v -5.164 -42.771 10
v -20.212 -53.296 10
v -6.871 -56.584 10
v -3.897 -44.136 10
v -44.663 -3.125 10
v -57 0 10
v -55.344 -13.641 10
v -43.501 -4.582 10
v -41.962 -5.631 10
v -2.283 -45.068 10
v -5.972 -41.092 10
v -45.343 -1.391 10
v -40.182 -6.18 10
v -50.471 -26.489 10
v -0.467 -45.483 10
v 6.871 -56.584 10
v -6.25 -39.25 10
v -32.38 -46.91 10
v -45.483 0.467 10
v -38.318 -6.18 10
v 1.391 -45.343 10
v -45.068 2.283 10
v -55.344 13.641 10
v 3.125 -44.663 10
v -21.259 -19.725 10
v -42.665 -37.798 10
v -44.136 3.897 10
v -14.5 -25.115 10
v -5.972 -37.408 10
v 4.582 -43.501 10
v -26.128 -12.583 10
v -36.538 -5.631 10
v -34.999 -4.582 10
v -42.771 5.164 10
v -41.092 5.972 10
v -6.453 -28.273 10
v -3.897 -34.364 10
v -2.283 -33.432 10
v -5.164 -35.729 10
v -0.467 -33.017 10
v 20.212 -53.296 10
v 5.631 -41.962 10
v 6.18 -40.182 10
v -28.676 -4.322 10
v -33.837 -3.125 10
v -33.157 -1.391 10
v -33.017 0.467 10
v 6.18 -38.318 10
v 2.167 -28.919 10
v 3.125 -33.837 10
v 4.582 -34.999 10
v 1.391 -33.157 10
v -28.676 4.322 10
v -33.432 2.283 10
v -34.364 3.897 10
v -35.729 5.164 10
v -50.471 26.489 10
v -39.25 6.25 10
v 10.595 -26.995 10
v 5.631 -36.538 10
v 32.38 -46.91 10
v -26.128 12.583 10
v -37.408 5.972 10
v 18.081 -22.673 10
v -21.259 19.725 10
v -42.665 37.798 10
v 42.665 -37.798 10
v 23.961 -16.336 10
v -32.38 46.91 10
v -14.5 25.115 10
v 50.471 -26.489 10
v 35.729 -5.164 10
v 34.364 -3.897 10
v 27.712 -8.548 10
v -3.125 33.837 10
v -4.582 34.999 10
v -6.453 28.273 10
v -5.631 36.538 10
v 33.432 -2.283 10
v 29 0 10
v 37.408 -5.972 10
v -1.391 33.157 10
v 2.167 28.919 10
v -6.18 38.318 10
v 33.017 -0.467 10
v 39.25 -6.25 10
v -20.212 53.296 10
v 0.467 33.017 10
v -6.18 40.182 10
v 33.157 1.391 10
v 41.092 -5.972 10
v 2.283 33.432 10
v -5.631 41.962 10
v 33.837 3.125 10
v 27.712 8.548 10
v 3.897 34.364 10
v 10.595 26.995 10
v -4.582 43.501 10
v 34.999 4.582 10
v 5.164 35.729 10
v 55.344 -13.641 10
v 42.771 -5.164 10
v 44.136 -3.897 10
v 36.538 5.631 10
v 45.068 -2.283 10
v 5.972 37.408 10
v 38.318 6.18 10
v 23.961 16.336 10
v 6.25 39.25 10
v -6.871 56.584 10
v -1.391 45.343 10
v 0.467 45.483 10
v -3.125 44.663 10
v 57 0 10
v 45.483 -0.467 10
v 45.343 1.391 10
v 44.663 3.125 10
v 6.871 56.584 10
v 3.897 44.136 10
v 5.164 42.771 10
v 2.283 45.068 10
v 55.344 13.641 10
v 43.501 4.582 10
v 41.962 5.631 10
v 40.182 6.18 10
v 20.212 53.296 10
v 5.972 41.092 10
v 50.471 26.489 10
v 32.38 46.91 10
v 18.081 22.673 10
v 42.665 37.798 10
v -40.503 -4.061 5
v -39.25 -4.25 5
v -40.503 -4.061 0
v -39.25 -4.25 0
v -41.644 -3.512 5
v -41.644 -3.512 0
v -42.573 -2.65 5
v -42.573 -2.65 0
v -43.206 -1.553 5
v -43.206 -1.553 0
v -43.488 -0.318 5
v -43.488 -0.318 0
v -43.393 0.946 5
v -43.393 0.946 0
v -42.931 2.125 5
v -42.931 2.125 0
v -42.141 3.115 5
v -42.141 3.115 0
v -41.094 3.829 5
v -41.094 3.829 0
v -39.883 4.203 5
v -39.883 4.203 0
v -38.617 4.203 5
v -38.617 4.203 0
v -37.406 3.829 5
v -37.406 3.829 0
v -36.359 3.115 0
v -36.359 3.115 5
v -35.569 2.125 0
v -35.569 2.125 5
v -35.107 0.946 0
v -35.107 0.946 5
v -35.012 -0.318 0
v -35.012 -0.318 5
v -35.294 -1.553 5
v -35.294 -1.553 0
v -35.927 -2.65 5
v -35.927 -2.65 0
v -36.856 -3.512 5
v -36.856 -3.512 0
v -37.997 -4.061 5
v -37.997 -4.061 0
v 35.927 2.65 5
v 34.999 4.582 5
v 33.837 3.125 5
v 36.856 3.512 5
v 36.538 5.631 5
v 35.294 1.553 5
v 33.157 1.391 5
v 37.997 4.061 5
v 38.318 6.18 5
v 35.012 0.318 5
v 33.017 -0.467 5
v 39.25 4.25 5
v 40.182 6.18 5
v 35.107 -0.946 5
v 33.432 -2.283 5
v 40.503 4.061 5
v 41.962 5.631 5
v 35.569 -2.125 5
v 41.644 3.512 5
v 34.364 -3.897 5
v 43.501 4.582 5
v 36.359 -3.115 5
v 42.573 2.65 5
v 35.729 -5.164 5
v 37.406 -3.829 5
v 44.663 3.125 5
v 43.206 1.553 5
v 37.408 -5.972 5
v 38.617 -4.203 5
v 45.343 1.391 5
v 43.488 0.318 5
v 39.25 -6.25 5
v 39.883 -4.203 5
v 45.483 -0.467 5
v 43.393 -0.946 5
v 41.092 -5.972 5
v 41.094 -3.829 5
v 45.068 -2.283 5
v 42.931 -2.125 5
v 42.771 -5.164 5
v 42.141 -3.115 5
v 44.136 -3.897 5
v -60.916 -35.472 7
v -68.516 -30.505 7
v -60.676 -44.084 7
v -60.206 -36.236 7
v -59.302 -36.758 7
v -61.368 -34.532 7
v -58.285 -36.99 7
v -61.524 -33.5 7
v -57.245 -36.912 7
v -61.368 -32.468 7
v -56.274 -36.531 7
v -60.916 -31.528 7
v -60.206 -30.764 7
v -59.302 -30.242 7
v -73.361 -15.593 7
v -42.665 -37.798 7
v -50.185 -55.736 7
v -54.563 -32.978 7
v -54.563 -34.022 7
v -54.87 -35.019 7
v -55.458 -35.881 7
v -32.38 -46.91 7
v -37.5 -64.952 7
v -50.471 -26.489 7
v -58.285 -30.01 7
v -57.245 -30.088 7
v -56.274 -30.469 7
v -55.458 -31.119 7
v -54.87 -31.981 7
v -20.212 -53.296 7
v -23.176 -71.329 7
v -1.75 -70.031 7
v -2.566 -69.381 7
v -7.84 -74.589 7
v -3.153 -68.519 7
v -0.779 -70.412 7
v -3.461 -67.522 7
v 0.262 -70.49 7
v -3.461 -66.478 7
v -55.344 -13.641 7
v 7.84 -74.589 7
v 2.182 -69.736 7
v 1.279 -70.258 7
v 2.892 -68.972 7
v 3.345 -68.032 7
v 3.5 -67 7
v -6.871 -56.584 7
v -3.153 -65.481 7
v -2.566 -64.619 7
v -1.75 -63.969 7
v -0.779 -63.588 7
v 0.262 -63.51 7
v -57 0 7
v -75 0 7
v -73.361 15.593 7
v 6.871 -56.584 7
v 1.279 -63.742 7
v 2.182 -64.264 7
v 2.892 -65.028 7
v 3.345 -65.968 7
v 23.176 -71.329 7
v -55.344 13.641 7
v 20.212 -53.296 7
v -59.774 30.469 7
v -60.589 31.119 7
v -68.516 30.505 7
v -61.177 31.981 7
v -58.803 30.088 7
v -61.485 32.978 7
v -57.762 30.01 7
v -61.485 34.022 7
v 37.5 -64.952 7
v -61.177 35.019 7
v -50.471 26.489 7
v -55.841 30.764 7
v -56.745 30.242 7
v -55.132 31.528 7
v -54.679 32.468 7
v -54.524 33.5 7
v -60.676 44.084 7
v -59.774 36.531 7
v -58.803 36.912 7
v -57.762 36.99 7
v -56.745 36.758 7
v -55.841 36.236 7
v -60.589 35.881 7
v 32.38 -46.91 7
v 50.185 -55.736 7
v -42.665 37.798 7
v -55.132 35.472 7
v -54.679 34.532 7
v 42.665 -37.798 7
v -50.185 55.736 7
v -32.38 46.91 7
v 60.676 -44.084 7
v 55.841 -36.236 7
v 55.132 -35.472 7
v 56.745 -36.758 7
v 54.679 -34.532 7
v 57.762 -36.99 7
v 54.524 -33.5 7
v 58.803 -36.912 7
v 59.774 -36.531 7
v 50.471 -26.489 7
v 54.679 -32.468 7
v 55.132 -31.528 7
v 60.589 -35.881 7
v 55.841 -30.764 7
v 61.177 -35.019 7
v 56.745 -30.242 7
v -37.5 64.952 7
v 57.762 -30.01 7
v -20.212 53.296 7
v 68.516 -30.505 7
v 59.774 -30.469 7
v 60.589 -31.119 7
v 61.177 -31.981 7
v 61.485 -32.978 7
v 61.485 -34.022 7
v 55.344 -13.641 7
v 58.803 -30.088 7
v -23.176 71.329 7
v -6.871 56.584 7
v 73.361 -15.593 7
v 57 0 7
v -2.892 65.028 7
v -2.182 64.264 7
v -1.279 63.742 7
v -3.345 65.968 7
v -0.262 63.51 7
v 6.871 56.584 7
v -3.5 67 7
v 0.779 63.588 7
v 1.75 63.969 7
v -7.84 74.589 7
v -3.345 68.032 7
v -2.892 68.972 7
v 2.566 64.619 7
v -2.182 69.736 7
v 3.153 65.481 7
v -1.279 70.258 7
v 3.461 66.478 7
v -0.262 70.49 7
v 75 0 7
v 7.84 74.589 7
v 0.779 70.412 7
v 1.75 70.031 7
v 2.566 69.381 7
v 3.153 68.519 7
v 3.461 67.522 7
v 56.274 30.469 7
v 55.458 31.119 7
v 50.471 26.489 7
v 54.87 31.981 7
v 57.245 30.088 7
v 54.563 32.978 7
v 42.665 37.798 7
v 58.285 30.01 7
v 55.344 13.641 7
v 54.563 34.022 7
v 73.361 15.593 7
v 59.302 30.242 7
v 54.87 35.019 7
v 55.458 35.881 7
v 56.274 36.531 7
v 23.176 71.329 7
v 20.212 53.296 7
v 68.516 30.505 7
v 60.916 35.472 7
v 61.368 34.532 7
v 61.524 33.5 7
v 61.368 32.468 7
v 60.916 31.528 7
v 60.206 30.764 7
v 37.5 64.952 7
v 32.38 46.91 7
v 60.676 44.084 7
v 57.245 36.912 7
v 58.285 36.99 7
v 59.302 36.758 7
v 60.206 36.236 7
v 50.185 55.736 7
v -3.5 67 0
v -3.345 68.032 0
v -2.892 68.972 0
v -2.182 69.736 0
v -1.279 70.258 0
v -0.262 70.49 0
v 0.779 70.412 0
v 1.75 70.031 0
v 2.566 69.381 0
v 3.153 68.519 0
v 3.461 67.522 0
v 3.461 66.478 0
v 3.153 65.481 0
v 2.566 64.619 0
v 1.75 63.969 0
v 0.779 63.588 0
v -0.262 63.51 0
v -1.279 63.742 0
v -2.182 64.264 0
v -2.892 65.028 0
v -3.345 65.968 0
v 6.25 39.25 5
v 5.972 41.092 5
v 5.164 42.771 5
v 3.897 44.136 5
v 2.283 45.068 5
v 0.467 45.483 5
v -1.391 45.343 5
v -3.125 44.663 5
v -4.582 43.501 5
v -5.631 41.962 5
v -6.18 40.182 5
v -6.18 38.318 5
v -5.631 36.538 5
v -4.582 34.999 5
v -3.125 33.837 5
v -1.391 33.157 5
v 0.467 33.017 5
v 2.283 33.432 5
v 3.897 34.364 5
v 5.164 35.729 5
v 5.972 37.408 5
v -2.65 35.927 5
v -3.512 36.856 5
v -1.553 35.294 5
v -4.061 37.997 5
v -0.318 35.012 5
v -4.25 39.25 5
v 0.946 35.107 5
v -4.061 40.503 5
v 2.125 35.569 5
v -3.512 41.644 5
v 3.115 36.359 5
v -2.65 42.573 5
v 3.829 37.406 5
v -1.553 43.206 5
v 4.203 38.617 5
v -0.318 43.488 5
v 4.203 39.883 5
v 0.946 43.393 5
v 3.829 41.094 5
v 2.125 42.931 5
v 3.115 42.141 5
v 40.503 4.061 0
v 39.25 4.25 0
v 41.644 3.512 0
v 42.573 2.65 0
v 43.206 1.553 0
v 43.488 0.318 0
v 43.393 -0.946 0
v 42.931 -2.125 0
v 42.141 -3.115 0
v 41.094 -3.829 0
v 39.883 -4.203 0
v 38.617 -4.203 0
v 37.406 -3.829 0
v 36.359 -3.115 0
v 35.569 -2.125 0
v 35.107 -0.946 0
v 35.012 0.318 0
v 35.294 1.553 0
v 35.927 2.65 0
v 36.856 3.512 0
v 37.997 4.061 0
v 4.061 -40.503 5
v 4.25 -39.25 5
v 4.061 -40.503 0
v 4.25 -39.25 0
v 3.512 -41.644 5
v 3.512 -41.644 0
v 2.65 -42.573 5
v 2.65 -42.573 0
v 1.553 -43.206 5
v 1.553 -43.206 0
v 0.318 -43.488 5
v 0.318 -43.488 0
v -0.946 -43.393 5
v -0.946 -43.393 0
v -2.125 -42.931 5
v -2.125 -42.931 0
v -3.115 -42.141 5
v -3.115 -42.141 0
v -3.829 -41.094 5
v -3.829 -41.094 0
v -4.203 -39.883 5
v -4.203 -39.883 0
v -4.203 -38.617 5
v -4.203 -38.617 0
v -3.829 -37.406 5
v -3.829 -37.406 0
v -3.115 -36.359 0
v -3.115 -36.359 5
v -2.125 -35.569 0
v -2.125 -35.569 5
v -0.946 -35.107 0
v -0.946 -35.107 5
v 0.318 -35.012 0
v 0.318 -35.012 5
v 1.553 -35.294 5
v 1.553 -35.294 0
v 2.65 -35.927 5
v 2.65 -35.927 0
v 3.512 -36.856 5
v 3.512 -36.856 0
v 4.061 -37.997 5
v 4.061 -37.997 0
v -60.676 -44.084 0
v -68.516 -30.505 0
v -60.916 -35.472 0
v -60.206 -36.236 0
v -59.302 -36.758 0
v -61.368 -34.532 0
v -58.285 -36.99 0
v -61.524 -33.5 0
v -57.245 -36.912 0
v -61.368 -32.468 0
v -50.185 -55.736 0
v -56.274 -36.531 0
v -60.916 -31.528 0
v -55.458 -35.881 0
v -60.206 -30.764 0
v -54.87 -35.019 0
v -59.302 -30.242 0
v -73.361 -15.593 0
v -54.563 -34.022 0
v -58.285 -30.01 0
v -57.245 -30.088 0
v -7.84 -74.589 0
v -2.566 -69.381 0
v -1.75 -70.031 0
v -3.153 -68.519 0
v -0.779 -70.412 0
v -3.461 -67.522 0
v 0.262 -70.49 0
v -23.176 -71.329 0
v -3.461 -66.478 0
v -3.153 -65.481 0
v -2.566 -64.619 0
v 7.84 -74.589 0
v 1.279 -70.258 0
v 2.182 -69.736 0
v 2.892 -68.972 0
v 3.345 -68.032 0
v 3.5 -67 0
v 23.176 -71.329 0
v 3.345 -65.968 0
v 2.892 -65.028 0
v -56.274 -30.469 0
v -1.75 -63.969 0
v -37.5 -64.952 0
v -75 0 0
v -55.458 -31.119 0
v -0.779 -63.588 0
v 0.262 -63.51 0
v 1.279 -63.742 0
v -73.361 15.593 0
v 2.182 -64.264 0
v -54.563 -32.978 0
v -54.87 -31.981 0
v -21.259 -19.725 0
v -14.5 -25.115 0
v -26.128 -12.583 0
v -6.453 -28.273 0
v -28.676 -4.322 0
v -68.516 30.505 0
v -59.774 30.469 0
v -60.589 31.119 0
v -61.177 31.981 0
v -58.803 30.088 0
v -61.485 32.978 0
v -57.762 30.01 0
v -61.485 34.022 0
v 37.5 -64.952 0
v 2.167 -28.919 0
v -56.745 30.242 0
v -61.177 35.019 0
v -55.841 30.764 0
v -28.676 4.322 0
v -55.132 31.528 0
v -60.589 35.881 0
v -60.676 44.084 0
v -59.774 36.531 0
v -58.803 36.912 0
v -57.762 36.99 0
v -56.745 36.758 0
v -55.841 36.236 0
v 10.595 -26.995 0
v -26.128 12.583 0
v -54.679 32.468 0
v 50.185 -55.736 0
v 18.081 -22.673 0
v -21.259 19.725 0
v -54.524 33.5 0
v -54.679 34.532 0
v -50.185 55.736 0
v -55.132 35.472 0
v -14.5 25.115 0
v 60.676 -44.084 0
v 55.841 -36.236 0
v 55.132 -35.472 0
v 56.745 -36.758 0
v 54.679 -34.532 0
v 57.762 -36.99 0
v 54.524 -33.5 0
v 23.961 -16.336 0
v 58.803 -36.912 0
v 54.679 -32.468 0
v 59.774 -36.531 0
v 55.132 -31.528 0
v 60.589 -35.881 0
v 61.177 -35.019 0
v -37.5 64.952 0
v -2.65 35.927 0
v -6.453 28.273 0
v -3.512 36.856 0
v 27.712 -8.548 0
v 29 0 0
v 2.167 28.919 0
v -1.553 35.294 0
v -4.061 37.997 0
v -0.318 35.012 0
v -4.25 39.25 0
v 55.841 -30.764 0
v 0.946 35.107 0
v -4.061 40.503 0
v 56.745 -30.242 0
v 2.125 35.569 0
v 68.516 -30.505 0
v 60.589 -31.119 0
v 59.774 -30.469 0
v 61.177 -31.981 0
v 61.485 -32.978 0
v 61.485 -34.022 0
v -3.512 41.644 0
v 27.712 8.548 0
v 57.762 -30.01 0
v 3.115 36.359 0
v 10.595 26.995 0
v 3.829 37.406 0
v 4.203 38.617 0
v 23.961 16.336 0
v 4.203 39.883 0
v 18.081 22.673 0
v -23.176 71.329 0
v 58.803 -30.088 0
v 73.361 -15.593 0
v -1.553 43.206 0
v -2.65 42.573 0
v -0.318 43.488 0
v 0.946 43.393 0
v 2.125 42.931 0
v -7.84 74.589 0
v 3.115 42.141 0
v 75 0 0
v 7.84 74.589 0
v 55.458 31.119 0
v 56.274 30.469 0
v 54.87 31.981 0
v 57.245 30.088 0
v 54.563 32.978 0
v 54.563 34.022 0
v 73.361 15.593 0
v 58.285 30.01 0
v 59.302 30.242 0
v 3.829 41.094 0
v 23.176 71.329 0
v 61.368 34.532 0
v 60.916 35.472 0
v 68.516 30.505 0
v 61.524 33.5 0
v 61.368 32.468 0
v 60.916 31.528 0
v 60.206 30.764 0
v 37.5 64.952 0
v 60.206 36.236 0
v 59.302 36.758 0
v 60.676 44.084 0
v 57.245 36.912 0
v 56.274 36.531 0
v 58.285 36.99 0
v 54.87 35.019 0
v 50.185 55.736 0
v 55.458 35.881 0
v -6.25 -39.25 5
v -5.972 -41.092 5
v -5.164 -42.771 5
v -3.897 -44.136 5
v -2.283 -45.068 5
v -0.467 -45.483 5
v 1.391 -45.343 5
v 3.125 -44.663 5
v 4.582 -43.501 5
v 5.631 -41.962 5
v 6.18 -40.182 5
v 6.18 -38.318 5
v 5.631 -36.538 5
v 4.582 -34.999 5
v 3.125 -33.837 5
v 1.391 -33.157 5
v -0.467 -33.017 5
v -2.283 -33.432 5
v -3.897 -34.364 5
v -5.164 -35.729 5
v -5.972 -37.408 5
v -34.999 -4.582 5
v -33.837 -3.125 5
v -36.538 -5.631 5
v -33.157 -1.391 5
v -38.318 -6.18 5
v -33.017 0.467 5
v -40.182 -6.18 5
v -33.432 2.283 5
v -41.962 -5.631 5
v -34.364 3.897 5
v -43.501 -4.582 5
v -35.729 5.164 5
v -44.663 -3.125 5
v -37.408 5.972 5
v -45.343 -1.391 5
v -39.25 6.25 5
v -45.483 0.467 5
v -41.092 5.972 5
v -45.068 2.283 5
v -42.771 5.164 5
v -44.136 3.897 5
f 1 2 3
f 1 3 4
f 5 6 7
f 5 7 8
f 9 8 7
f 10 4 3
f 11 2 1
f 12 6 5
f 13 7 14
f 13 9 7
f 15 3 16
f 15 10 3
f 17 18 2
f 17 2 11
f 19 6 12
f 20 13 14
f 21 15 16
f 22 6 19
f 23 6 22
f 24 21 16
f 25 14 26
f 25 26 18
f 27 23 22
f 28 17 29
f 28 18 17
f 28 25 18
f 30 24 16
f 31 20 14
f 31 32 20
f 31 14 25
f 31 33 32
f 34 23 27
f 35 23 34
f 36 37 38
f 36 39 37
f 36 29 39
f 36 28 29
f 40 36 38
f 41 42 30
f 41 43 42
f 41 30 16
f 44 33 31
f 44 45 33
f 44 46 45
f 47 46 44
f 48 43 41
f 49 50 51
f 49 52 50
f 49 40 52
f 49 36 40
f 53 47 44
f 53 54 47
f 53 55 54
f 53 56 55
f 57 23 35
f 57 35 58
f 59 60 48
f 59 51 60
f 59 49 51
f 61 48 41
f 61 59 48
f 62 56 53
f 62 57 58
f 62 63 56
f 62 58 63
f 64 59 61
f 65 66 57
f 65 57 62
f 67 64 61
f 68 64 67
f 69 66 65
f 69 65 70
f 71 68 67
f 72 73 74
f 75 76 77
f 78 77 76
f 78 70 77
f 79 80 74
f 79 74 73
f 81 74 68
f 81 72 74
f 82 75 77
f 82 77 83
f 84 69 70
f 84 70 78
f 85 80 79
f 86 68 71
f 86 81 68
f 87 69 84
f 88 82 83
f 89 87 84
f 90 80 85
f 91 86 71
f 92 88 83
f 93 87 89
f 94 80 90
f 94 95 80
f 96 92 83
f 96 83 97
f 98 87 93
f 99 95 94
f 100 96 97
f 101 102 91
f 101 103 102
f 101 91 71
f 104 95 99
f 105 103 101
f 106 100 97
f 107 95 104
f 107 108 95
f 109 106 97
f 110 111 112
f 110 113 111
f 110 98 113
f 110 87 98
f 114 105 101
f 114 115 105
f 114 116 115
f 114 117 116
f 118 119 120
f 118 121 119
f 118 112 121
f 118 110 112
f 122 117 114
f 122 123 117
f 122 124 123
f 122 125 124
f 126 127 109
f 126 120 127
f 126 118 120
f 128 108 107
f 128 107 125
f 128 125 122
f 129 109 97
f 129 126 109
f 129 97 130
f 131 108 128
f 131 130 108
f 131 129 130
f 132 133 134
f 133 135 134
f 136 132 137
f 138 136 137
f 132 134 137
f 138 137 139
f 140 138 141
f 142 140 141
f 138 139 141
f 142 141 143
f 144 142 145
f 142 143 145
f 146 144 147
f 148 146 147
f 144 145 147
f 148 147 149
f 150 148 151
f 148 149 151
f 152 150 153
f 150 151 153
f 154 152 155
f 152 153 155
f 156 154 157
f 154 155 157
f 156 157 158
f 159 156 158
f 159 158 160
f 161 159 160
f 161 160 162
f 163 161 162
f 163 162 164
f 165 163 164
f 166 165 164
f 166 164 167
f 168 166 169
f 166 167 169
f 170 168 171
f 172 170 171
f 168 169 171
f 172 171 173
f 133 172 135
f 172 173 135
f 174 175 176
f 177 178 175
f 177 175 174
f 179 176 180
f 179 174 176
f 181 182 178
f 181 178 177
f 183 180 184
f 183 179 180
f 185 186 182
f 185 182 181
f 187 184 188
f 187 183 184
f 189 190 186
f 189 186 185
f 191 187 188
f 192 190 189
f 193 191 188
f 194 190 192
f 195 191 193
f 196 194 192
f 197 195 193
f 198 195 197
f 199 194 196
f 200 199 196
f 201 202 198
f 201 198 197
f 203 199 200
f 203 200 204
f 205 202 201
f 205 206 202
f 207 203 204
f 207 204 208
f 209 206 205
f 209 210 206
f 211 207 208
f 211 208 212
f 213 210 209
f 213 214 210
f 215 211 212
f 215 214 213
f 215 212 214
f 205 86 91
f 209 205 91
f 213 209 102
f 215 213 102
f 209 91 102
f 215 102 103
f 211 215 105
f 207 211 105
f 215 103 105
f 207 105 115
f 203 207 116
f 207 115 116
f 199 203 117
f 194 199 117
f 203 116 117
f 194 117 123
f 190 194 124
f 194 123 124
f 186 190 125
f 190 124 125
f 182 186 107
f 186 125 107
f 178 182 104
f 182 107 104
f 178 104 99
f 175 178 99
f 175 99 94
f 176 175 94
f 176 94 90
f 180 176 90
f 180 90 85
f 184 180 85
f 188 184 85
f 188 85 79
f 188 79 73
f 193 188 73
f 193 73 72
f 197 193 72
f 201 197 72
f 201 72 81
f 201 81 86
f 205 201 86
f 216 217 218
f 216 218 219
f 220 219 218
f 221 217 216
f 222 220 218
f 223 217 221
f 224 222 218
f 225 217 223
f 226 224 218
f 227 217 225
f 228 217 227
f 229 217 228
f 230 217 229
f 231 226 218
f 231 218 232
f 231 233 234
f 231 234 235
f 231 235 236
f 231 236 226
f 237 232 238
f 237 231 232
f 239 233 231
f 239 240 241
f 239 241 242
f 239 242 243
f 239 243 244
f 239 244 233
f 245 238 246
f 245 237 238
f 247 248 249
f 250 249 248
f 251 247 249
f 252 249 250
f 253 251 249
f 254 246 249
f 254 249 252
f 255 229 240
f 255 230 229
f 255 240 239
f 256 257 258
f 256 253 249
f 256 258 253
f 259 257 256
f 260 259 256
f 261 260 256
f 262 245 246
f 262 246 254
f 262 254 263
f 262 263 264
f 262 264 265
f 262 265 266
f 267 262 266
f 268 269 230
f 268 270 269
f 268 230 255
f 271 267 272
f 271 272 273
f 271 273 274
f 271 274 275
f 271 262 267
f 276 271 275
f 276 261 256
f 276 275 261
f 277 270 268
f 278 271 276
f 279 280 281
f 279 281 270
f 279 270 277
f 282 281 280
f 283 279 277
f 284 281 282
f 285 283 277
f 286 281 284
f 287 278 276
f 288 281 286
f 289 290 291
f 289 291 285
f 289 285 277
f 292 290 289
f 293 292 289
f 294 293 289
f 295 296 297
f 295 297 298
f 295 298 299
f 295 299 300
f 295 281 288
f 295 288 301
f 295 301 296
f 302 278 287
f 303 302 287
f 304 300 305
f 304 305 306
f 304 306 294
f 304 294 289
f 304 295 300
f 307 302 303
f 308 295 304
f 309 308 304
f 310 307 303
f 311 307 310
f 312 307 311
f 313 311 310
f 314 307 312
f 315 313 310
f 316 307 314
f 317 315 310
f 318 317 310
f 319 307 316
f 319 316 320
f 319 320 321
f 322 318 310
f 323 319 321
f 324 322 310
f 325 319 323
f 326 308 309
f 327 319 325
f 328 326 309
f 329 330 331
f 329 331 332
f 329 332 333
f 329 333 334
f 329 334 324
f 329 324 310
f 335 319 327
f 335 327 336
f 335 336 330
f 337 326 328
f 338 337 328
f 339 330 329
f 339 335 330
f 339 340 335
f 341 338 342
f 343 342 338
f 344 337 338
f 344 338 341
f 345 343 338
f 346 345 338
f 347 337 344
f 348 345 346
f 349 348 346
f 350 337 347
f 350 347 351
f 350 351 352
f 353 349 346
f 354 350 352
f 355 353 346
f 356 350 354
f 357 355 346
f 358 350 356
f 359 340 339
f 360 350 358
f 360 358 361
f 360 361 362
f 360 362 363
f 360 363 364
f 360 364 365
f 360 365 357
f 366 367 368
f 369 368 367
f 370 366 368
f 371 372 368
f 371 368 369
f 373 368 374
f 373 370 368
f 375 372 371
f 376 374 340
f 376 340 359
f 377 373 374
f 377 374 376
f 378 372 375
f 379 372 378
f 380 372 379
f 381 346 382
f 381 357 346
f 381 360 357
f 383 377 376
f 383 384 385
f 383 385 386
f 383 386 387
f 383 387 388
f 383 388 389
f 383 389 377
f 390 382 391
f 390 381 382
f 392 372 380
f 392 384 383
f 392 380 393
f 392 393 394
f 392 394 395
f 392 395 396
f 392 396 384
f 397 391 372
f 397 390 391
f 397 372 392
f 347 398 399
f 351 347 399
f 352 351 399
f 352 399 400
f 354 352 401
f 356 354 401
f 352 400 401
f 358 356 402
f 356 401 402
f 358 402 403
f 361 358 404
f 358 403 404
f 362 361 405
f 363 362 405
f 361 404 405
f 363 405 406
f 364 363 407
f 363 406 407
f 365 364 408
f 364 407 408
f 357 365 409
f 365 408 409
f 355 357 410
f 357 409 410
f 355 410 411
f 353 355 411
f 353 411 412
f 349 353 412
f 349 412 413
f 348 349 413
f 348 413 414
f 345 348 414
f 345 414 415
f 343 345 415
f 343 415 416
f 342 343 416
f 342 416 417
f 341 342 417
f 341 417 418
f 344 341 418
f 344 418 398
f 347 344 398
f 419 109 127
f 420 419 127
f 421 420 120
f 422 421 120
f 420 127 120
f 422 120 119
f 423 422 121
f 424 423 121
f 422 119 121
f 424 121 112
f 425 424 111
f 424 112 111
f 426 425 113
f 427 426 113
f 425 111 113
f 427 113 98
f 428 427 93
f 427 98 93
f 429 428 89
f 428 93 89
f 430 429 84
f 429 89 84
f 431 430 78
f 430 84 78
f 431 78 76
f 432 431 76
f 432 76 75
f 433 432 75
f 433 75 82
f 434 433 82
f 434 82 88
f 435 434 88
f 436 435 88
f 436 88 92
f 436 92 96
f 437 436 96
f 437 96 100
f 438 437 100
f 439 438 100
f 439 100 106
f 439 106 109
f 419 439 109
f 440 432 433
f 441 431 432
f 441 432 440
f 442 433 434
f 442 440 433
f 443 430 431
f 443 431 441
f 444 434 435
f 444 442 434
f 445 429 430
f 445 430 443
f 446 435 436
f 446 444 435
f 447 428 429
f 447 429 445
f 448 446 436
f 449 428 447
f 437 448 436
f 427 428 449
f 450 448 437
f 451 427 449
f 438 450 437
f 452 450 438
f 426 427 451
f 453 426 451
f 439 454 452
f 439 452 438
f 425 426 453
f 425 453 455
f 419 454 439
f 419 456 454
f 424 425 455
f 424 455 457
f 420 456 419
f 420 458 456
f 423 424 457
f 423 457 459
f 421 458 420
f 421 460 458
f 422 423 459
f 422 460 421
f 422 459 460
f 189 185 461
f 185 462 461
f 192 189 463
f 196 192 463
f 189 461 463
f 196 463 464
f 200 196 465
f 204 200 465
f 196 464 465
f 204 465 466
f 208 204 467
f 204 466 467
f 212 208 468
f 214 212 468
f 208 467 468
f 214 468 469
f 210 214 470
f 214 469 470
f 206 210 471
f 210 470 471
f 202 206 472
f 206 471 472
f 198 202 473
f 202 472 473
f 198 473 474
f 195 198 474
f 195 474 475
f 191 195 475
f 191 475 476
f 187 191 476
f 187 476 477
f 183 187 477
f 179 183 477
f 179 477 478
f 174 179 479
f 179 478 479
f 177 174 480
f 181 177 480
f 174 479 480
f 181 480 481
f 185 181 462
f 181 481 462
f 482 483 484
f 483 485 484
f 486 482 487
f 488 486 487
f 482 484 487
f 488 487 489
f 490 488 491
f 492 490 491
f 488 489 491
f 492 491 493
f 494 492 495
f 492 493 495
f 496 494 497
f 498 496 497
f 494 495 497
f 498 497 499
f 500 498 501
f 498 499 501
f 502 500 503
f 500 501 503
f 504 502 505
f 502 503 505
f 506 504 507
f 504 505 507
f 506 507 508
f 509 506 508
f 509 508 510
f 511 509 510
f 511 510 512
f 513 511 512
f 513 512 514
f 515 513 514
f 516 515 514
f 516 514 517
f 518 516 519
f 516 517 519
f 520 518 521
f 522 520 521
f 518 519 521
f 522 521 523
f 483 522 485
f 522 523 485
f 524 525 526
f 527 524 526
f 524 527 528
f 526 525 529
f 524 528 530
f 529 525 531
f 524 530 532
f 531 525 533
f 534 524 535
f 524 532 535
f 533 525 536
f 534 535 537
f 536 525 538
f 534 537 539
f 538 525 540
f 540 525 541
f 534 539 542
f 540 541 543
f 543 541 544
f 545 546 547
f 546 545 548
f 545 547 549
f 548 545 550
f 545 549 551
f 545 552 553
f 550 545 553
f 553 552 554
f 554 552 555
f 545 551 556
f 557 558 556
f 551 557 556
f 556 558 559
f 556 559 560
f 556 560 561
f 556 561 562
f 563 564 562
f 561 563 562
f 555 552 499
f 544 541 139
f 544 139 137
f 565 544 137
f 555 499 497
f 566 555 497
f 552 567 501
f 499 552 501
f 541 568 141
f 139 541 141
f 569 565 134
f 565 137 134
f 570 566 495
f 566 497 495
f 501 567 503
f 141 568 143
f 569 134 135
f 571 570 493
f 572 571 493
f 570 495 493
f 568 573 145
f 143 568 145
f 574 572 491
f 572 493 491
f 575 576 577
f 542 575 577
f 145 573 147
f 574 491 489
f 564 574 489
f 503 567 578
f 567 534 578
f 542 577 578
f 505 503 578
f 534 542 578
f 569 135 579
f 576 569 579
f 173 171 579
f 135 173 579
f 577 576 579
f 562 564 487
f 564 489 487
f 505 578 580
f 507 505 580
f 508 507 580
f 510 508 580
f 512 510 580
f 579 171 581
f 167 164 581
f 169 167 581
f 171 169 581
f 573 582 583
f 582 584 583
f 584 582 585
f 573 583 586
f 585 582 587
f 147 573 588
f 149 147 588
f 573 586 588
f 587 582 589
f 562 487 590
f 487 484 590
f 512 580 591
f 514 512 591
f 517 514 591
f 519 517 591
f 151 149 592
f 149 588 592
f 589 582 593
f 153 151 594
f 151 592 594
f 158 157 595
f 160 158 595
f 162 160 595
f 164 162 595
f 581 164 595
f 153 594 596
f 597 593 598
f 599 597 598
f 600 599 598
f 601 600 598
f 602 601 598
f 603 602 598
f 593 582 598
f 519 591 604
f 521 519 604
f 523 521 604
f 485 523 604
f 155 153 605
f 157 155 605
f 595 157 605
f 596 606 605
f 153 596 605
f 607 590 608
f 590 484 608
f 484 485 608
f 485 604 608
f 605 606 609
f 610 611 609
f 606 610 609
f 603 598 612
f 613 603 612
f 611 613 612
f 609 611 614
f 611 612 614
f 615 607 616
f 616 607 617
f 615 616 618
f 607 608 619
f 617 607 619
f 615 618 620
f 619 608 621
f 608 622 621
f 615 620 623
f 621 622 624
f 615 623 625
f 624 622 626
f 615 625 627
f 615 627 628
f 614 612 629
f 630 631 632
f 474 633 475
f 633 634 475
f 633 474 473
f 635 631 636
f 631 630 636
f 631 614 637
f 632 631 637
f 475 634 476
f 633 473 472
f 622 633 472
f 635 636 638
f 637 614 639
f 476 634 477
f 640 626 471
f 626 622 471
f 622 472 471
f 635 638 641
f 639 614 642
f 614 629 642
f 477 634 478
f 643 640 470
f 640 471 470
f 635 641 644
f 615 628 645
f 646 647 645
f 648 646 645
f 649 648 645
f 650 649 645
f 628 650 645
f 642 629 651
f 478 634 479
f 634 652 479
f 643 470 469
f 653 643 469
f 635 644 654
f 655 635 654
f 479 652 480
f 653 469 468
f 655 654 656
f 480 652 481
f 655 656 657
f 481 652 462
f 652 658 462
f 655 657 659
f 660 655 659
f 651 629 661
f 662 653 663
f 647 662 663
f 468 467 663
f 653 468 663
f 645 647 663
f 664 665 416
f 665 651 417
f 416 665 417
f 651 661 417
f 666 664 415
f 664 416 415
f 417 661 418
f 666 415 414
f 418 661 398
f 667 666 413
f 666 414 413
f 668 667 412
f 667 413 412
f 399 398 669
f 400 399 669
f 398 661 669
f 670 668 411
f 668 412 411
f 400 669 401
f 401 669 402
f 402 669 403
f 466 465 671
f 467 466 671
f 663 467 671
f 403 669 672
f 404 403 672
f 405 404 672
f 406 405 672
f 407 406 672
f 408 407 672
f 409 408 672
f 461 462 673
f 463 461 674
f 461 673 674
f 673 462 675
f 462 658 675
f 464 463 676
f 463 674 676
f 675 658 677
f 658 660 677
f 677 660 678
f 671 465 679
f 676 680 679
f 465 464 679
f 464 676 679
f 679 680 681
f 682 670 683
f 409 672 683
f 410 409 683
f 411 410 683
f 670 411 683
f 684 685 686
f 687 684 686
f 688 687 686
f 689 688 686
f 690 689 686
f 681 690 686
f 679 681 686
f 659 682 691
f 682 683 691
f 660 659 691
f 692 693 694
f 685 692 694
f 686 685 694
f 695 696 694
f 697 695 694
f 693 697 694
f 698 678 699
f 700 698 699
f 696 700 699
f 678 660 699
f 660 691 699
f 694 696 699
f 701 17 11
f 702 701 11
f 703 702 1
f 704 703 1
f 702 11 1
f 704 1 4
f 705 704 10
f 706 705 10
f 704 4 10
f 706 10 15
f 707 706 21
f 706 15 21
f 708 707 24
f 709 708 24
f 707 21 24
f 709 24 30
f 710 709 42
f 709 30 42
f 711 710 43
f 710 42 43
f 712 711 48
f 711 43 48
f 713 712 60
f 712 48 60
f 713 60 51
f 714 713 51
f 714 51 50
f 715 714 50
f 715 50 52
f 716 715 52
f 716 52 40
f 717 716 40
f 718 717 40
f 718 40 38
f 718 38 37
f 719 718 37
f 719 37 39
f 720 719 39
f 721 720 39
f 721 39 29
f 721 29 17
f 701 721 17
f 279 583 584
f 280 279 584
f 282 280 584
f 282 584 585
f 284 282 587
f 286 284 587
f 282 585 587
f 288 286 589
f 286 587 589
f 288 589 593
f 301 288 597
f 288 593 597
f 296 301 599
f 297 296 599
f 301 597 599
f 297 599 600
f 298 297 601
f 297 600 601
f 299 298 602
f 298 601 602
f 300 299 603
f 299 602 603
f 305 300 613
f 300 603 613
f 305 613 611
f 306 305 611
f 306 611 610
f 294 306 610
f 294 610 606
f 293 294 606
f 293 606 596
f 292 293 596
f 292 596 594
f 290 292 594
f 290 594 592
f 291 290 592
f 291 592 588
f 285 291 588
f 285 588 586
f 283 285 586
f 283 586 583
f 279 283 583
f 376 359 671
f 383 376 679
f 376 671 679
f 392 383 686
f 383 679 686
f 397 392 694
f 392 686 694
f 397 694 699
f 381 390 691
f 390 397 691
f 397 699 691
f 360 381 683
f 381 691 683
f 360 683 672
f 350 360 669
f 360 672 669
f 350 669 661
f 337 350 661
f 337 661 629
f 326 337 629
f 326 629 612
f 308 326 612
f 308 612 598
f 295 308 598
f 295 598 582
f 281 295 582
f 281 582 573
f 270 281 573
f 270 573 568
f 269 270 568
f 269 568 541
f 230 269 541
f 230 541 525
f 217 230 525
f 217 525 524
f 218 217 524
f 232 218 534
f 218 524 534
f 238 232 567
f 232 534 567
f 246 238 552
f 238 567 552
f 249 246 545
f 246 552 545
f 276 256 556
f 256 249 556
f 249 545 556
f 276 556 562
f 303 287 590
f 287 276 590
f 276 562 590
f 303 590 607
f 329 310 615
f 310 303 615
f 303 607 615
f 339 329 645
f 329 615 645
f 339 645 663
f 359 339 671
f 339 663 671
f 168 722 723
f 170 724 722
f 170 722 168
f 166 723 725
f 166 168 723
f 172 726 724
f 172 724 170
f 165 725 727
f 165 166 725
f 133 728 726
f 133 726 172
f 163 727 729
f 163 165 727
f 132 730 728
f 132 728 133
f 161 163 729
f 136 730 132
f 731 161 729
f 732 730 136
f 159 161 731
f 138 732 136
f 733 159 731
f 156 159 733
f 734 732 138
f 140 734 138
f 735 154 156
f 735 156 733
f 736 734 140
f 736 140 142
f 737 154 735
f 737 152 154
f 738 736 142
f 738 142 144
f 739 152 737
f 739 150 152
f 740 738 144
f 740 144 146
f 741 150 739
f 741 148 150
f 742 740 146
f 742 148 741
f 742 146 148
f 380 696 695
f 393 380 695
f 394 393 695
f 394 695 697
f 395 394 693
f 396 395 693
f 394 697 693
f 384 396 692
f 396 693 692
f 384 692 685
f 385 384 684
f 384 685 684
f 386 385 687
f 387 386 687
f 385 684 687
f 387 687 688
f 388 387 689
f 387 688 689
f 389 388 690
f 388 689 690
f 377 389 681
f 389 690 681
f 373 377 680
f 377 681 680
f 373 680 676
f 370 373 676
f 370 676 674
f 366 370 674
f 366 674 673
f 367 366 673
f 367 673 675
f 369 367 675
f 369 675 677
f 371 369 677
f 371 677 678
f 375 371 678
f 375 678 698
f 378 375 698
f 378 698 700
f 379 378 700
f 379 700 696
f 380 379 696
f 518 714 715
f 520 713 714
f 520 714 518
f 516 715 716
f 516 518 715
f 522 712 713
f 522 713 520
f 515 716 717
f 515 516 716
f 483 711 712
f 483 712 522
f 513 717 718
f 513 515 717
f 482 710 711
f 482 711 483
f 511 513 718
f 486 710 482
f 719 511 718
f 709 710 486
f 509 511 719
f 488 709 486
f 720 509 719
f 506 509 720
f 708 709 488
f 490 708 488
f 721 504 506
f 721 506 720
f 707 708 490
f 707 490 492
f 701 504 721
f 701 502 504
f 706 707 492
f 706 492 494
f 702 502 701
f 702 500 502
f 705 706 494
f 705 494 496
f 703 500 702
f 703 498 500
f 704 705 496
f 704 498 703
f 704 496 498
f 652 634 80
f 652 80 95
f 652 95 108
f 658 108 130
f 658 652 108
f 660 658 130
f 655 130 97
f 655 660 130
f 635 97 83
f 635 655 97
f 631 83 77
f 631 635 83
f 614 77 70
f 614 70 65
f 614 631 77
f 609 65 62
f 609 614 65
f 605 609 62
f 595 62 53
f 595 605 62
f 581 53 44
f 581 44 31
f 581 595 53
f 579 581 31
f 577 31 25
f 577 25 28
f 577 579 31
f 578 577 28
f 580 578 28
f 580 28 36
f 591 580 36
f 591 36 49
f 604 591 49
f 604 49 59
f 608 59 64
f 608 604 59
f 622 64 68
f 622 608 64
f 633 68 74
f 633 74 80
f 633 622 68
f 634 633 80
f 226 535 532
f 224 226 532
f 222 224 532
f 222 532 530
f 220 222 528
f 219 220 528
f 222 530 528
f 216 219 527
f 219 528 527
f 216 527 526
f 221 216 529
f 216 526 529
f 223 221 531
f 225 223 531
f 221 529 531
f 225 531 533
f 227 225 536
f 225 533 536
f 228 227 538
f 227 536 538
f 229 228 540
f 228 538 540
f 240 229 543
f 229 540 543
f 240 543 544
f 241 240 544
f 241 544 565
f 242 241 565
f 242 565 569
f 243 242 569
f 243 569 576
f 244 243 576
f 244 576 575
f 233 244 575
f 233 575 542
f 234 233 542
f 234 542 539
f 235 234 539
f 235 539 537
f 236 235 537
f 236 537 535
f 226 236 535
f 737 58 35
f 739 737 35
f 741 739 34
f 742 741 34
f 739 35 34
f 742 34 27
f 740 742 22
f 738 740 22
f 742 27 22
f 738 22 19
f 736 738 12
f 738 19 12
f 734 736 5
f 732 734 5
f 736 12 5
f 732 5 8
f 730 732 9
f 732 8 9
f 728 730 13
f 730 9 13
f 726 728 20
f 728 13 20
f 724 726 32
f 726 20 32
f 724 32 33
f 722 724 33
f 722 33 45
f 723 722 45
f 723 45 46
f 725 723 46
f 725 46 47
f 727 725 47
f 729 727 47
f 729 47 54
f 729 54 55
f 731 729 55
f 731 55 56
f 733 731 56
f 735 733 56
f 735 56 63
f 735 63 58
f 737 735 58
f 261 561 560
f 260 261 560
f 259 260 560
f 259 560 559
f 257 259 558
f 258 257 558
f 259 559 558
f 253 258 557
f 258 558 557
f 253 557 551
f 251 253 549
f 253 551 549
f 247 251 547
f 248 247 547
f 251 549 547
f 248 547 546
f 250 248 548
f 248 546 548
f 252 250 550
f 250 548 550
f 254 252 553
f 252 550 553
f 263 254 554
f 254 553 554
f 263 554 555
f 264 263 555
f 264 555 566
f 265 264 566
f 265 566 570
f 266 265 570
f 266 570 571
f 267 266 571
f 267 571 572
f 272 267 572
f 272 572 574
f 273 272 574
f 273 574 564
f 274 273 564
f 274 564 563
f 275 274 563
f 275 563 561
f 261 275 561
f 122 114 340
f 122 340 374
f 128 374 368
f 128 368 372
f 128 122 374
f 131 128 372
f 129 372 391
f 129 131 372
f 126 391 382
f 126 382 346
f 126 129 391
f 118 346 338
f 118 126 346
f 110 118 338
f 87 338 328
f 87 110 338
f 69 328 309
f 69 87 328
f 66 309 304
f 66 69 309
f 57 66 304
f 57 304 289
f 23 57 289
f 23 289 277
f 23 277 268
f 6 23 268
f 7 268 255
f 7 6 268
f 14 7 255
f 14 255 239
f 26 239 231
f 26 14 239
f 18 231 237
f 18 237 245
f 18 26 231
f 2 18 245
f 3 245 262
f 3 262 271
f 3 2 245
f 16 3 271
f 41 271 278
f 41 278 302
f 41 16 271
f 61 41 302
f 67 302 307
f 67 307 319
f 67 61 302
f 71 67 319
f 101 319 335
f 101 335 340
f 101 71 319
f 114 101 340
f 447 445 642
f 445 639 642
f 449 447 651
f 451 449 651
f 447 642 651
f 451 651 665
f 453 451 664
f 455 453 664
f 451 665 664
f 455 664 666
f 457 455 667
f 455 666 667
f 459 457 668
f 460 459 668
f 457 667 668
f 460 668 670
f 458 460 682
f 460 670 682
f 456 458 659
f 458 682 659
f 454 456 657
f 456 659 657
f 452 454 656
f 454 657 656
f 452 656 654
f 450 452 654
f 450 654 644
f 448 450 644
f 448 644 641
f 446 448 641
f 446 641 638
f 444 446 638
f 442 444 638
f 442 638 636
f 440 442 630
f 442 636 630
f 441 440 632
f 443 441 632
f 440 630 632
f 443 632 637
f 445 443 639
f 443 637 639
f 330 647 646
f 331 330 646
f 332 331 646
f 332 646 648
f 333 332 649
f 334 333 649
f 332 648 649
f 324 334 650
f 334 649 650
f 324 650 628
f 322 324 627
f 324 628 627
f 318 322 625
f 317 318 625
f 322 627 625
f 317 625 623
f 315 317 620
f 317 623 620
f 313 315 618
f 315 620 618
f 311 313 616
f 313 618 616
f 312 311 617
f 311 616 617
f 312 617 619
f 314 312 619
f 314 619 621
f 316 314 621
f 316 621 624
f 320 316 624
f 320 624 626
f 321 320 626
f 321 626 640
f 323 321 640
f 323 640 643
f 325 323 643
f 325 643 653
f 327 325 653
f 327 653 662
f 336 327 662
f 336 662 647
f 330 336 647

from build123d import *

# Parameters (mm, degrees)
SKETCH1_R           = 75
SKETCH1_R_2         = 29
BOSS_EXTRUDE1_DEPTH = 10
SKETCH2_R           = 84.502985649
SKETCH2_R_2         = 57
CUT_EXTRUDE2_DEPTH  = 3
HOLE1_D             = 8.5
HOLE1_CBORE_D       = 12.5
HOLE1_CBORE_DEPTH   = 5
CIRPATTERN1_COUNT   = 4
HOLE2_D             = 7
CIRPATTERN2_COUNT   = 6


with BuildPart() as part:
    # Sketch1 → Boss-Extrude1 (new body)
    with BuildSketch(Plane.XY):
        Circle(SKETCH1_R)
        Circle(SKETCH1_R_2, mode=Mode.SUBTRACT)
    extrude(amount=BOSS_EXTRUDE1_DEPTH)

    # Sketch2 → Cut-Extrude2 (cut)
    with BuildSketch(Plane.XY.offset(10)):
        Circle(SKETCH2_R)
        Circle(SKETCH2_R_2, mode=Mode.SUBTRACT)
    extrude(amount=-CUT_EXTRUDE2_DEPTH, mode=Mode.SUBTRACT)

    # Hole1 (through all)
    with Locations(Plane(origin=(0, 39.25, 10), x_dir=(1, 0, 0), z_dir=(0, 0, 1))):
        with Locations((0, 0)):
            hole1 = CounterBoreHole(HOLE1_D / 2, HOLE1_CBORE_D / 2, HOLE1_CBORE_DEPTH)

    # CirPattern1: Hole1 ×4 about axis
    cirpattern1_axis = Axis((0, 0, 0), (0, 0, 1))
    for i in range(1, CIRPATTERN1_COUNT):
        add(hole1.rotate(cirpattern1_axis, i * 360 / CIRPATTERN1_COUNT), mode=Mode.SUBTRACT)

    # Hole2 (through all)
    with Locations(Plane.XY.offset(7)):
        with Locations((0, 67)):
            hole2 = Hole(HOLE2_D / 2)

    # CirPattern2: Hole2 ×6 about axis
    cirpattern2_axis = Axis((0, 0, 0), (0, 0, 1))
    for i in range(1, CIRPATTERN2_COUNT):
        add(hole2.rotate(cirpattern2_axis, i * 360 / CIRPATTERN2_COUNT), mode=Mode.SUBTRACT)


solid = part.part
